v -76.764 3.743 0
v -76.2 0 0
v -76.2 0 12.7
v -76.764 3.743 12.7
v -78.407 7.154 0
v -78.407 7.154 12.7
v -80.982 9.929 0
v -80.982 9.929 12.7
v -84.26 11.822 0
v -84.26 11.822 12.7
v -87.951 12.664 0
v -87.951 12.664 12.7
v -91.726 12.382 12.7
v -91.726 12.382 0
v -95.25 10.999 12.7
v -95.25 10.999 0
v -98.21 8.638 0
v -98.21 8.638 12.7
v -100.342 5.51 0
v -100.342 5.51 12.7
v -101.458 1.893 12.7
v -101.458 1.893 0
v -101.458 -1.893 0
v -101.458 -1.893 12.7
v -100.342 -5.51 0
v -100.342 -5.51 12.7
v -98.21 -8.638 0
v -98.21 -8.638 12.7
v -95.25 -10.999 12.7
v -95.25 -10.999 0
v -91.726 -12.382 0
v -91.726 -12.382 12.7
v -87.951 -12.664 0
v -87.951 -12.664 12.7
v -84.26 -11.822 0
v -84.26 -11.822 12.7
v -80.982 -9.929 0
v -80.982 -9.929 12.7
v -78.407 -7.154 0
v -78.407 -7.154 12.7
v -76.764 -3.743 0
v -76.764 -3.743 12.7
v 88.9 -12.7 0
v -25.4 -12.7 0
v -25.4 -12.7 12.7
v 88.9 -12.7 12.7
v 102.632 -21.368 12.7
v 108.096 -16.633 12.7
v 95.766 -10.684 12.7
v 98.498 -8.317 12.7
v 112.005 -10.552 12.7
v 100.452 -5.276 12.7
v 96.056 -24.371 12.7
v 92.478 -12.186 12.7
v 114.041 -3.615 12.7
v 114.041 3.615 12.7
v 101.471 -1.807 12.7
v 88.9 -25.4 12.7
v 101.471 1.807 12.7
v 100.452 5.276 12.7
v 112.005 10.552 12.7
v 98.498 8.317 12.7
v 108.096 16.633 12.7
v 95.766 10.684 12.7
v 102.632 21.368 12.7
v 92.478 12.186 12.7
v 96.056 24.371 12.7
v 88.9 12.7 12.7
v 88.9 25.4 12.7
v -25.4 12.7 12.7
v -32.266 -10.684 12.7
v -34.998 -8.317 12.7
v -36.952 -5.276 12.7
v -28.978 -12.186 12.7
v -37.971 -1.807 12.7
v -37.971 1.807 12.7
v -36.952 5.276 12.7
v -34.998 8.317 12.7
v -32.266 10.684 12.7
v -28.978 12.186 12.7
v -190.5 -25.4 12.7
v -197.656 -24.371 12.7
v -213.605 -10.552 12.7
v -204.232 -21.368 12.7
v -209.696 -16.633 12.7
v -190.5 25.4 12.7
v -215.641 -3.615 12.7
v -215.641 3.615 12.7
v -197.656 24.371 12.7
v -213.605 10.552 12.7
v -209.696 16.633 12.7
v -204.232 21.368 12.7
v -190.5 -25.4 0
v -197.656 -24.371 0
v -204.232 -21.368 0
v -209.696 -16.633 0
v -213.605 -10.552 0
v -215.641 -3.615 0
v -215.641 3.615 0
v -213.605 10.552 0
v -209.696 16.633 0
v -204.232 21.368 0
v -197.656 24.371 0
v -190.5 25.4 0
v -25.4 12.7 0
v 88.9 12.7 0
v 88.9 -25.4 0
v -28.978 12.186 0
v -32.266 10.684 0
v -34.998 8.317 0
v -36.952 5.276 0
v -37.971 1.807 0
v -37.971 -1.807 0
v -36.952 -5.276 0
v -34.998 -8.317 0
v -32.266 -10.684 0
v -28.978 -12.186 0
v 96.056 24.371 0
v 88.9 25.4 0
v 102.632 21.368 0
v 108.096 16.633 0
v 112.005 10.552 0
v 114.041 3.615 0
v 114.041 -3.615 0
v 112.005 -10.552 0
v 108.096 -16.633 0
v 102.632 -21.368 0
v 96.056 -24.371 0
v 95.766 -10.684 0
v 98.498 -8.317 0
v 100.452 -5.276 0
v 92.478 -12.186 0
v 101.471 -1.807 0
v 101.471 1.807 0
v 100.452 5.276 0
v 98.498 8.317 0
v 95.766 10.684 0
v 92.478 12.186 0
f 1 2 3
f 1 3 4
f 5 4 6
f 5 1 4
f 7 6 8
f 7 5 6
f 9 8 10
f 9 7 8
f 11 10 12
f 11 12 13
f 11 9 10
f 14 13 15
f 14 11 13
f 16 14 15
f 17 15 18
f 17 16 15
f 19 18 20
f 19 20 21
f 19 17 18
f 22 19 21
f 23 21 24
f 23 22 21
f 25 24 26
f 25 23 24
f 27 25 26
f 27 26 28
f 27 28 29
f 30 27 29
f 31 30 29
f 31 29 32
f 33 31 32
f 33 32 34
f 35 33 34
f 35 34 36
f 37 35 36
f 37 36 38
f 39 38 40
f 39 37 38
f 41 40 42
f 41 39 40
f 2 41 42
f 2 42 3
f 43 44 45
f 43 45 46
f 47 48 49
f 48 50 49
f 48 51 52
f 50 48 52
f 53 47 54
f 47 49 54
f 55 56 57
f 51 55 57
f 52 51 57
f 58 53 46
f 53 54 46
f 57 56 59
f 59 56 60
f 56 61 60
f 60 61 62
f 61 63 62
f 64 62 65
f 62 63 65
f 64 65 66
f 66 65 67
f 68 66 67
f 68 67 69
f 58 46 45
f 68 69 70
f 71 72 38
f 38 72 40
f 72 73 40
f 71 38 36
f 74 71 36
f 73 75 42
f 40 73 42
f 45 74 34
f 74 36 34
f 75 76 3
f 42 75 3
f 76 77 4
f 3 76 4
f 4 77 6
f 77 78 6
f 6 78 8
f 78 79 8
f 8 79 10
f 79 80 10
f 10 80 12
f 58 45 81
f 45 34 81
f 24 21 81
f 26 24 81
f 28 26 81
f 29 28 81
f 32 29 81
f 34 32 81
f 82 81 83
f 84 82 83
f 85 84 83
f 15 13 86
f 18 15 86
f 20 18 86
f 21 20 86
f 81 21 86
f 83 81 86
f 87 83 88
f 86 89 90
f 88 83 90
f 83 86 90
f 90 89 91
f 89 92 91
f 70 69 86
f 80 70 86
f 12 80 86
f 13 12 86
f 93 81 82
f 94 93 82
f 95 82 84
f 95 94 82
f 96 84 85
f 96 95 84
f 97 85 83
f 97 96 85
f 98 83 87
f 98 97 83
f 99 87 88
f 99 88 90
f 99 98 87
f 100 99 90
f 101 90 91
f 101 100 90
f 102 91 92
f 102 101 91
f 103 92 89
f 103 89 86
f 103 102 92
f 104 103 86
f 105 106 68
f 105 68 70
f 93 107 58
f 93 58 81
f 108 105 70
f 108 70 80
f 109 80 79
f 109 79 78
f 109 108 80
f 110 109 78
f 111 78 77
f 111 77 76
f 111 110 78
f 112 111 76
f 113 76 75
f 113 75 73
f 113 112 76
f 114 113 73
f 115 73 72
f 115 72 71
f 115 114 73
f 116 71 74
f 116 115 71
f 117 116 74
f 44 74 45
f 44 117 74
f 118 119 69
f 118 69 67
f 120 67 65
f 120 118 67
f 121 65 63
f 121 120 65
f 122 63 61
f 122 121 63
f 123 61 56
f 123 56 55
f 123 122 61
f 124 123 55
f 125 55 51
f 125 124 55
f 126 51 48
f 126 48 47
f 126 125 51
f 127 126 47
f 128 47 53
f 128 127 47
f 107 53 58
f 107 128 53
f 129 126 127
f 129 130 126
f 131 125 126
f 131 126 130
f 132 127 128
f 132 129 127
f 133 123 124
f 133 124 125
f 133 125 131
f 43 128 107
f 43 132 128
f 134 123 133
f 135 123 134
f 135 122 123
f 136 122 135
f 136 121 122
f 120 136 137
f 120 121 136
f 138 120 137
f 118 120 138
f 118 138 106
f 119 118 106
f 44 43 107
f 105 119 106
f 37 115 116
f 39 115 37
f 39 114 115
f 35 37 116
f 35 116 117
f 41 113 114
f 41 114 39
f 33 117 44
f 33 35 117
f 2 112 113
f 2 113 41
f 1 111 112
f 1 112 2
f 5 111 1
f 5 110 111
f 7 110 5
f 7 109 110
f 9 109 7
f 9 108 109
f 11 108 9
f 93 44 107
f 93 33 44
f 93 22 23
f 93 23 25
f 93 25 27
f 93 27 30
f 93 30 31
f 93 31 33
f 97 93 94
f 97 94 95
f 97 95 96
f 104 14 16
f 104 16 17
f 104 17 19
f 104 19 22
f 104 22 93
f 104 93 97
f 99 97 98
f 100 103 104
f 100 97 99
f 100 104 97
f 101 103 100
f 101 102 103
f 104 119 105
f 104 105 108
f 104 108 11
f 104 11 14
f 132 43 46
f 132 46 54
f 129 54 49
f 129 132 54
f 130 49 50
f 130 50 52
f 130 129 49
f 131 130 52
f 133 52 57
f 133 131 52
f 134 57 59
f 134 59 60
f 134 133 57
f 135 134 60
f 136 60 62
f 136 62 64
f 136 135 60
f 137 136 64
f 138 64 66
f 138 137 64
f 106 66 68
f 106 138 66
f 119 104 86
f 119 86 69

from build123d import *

# Parameters (mm, degrees)
SKETCH1_R           = 12.7
BOSS_EXTRUDE1_DEPTH = 12.7


with BuildPart() as part:
    # Sketch1 → Boss-Extrude1 (new body)
    with BuildSketch(Plane.XY):
        with BuildLine():
            Line((-88.9, 25.4), (88.9, 25.4))
            ThreePointArc((88.9, 25.4), (114.3, 0), (88.9, -25.4))
            Line((88.9, -25.4), (-88.9, -25.4))
            Line((-88.9, -25.4), (-190.5, -25.4))
            ThreePointArc((-190.5, -25.4), (-215.9, 0), (-190.5, 25.4))
            Line((-190.5, 25.4), (-88.9, 25.4))
        make_face()
        with Locations((-88.9, 0)):
            Circle(SKETCH1_R, mode=Mode.SUBTRACT)
        with BuildLine():
            Line((88.9, 12.7), (-25.4, 12.7))
            ThreePointArc((-25.4, 12.7), (-38.1, 0), (-25.4, -12.7))
            Line((-25.4, -12.7), (88.9, -12.7))
            ThreePointArc((88.9, -12.7), (101.6, 0), (88.9, 12.7))
        make_face(mode=Mode.SUBTRACT)
    extrude(amount=BOSS_EXTRUDE1_DEPTH)


solid = part.part
